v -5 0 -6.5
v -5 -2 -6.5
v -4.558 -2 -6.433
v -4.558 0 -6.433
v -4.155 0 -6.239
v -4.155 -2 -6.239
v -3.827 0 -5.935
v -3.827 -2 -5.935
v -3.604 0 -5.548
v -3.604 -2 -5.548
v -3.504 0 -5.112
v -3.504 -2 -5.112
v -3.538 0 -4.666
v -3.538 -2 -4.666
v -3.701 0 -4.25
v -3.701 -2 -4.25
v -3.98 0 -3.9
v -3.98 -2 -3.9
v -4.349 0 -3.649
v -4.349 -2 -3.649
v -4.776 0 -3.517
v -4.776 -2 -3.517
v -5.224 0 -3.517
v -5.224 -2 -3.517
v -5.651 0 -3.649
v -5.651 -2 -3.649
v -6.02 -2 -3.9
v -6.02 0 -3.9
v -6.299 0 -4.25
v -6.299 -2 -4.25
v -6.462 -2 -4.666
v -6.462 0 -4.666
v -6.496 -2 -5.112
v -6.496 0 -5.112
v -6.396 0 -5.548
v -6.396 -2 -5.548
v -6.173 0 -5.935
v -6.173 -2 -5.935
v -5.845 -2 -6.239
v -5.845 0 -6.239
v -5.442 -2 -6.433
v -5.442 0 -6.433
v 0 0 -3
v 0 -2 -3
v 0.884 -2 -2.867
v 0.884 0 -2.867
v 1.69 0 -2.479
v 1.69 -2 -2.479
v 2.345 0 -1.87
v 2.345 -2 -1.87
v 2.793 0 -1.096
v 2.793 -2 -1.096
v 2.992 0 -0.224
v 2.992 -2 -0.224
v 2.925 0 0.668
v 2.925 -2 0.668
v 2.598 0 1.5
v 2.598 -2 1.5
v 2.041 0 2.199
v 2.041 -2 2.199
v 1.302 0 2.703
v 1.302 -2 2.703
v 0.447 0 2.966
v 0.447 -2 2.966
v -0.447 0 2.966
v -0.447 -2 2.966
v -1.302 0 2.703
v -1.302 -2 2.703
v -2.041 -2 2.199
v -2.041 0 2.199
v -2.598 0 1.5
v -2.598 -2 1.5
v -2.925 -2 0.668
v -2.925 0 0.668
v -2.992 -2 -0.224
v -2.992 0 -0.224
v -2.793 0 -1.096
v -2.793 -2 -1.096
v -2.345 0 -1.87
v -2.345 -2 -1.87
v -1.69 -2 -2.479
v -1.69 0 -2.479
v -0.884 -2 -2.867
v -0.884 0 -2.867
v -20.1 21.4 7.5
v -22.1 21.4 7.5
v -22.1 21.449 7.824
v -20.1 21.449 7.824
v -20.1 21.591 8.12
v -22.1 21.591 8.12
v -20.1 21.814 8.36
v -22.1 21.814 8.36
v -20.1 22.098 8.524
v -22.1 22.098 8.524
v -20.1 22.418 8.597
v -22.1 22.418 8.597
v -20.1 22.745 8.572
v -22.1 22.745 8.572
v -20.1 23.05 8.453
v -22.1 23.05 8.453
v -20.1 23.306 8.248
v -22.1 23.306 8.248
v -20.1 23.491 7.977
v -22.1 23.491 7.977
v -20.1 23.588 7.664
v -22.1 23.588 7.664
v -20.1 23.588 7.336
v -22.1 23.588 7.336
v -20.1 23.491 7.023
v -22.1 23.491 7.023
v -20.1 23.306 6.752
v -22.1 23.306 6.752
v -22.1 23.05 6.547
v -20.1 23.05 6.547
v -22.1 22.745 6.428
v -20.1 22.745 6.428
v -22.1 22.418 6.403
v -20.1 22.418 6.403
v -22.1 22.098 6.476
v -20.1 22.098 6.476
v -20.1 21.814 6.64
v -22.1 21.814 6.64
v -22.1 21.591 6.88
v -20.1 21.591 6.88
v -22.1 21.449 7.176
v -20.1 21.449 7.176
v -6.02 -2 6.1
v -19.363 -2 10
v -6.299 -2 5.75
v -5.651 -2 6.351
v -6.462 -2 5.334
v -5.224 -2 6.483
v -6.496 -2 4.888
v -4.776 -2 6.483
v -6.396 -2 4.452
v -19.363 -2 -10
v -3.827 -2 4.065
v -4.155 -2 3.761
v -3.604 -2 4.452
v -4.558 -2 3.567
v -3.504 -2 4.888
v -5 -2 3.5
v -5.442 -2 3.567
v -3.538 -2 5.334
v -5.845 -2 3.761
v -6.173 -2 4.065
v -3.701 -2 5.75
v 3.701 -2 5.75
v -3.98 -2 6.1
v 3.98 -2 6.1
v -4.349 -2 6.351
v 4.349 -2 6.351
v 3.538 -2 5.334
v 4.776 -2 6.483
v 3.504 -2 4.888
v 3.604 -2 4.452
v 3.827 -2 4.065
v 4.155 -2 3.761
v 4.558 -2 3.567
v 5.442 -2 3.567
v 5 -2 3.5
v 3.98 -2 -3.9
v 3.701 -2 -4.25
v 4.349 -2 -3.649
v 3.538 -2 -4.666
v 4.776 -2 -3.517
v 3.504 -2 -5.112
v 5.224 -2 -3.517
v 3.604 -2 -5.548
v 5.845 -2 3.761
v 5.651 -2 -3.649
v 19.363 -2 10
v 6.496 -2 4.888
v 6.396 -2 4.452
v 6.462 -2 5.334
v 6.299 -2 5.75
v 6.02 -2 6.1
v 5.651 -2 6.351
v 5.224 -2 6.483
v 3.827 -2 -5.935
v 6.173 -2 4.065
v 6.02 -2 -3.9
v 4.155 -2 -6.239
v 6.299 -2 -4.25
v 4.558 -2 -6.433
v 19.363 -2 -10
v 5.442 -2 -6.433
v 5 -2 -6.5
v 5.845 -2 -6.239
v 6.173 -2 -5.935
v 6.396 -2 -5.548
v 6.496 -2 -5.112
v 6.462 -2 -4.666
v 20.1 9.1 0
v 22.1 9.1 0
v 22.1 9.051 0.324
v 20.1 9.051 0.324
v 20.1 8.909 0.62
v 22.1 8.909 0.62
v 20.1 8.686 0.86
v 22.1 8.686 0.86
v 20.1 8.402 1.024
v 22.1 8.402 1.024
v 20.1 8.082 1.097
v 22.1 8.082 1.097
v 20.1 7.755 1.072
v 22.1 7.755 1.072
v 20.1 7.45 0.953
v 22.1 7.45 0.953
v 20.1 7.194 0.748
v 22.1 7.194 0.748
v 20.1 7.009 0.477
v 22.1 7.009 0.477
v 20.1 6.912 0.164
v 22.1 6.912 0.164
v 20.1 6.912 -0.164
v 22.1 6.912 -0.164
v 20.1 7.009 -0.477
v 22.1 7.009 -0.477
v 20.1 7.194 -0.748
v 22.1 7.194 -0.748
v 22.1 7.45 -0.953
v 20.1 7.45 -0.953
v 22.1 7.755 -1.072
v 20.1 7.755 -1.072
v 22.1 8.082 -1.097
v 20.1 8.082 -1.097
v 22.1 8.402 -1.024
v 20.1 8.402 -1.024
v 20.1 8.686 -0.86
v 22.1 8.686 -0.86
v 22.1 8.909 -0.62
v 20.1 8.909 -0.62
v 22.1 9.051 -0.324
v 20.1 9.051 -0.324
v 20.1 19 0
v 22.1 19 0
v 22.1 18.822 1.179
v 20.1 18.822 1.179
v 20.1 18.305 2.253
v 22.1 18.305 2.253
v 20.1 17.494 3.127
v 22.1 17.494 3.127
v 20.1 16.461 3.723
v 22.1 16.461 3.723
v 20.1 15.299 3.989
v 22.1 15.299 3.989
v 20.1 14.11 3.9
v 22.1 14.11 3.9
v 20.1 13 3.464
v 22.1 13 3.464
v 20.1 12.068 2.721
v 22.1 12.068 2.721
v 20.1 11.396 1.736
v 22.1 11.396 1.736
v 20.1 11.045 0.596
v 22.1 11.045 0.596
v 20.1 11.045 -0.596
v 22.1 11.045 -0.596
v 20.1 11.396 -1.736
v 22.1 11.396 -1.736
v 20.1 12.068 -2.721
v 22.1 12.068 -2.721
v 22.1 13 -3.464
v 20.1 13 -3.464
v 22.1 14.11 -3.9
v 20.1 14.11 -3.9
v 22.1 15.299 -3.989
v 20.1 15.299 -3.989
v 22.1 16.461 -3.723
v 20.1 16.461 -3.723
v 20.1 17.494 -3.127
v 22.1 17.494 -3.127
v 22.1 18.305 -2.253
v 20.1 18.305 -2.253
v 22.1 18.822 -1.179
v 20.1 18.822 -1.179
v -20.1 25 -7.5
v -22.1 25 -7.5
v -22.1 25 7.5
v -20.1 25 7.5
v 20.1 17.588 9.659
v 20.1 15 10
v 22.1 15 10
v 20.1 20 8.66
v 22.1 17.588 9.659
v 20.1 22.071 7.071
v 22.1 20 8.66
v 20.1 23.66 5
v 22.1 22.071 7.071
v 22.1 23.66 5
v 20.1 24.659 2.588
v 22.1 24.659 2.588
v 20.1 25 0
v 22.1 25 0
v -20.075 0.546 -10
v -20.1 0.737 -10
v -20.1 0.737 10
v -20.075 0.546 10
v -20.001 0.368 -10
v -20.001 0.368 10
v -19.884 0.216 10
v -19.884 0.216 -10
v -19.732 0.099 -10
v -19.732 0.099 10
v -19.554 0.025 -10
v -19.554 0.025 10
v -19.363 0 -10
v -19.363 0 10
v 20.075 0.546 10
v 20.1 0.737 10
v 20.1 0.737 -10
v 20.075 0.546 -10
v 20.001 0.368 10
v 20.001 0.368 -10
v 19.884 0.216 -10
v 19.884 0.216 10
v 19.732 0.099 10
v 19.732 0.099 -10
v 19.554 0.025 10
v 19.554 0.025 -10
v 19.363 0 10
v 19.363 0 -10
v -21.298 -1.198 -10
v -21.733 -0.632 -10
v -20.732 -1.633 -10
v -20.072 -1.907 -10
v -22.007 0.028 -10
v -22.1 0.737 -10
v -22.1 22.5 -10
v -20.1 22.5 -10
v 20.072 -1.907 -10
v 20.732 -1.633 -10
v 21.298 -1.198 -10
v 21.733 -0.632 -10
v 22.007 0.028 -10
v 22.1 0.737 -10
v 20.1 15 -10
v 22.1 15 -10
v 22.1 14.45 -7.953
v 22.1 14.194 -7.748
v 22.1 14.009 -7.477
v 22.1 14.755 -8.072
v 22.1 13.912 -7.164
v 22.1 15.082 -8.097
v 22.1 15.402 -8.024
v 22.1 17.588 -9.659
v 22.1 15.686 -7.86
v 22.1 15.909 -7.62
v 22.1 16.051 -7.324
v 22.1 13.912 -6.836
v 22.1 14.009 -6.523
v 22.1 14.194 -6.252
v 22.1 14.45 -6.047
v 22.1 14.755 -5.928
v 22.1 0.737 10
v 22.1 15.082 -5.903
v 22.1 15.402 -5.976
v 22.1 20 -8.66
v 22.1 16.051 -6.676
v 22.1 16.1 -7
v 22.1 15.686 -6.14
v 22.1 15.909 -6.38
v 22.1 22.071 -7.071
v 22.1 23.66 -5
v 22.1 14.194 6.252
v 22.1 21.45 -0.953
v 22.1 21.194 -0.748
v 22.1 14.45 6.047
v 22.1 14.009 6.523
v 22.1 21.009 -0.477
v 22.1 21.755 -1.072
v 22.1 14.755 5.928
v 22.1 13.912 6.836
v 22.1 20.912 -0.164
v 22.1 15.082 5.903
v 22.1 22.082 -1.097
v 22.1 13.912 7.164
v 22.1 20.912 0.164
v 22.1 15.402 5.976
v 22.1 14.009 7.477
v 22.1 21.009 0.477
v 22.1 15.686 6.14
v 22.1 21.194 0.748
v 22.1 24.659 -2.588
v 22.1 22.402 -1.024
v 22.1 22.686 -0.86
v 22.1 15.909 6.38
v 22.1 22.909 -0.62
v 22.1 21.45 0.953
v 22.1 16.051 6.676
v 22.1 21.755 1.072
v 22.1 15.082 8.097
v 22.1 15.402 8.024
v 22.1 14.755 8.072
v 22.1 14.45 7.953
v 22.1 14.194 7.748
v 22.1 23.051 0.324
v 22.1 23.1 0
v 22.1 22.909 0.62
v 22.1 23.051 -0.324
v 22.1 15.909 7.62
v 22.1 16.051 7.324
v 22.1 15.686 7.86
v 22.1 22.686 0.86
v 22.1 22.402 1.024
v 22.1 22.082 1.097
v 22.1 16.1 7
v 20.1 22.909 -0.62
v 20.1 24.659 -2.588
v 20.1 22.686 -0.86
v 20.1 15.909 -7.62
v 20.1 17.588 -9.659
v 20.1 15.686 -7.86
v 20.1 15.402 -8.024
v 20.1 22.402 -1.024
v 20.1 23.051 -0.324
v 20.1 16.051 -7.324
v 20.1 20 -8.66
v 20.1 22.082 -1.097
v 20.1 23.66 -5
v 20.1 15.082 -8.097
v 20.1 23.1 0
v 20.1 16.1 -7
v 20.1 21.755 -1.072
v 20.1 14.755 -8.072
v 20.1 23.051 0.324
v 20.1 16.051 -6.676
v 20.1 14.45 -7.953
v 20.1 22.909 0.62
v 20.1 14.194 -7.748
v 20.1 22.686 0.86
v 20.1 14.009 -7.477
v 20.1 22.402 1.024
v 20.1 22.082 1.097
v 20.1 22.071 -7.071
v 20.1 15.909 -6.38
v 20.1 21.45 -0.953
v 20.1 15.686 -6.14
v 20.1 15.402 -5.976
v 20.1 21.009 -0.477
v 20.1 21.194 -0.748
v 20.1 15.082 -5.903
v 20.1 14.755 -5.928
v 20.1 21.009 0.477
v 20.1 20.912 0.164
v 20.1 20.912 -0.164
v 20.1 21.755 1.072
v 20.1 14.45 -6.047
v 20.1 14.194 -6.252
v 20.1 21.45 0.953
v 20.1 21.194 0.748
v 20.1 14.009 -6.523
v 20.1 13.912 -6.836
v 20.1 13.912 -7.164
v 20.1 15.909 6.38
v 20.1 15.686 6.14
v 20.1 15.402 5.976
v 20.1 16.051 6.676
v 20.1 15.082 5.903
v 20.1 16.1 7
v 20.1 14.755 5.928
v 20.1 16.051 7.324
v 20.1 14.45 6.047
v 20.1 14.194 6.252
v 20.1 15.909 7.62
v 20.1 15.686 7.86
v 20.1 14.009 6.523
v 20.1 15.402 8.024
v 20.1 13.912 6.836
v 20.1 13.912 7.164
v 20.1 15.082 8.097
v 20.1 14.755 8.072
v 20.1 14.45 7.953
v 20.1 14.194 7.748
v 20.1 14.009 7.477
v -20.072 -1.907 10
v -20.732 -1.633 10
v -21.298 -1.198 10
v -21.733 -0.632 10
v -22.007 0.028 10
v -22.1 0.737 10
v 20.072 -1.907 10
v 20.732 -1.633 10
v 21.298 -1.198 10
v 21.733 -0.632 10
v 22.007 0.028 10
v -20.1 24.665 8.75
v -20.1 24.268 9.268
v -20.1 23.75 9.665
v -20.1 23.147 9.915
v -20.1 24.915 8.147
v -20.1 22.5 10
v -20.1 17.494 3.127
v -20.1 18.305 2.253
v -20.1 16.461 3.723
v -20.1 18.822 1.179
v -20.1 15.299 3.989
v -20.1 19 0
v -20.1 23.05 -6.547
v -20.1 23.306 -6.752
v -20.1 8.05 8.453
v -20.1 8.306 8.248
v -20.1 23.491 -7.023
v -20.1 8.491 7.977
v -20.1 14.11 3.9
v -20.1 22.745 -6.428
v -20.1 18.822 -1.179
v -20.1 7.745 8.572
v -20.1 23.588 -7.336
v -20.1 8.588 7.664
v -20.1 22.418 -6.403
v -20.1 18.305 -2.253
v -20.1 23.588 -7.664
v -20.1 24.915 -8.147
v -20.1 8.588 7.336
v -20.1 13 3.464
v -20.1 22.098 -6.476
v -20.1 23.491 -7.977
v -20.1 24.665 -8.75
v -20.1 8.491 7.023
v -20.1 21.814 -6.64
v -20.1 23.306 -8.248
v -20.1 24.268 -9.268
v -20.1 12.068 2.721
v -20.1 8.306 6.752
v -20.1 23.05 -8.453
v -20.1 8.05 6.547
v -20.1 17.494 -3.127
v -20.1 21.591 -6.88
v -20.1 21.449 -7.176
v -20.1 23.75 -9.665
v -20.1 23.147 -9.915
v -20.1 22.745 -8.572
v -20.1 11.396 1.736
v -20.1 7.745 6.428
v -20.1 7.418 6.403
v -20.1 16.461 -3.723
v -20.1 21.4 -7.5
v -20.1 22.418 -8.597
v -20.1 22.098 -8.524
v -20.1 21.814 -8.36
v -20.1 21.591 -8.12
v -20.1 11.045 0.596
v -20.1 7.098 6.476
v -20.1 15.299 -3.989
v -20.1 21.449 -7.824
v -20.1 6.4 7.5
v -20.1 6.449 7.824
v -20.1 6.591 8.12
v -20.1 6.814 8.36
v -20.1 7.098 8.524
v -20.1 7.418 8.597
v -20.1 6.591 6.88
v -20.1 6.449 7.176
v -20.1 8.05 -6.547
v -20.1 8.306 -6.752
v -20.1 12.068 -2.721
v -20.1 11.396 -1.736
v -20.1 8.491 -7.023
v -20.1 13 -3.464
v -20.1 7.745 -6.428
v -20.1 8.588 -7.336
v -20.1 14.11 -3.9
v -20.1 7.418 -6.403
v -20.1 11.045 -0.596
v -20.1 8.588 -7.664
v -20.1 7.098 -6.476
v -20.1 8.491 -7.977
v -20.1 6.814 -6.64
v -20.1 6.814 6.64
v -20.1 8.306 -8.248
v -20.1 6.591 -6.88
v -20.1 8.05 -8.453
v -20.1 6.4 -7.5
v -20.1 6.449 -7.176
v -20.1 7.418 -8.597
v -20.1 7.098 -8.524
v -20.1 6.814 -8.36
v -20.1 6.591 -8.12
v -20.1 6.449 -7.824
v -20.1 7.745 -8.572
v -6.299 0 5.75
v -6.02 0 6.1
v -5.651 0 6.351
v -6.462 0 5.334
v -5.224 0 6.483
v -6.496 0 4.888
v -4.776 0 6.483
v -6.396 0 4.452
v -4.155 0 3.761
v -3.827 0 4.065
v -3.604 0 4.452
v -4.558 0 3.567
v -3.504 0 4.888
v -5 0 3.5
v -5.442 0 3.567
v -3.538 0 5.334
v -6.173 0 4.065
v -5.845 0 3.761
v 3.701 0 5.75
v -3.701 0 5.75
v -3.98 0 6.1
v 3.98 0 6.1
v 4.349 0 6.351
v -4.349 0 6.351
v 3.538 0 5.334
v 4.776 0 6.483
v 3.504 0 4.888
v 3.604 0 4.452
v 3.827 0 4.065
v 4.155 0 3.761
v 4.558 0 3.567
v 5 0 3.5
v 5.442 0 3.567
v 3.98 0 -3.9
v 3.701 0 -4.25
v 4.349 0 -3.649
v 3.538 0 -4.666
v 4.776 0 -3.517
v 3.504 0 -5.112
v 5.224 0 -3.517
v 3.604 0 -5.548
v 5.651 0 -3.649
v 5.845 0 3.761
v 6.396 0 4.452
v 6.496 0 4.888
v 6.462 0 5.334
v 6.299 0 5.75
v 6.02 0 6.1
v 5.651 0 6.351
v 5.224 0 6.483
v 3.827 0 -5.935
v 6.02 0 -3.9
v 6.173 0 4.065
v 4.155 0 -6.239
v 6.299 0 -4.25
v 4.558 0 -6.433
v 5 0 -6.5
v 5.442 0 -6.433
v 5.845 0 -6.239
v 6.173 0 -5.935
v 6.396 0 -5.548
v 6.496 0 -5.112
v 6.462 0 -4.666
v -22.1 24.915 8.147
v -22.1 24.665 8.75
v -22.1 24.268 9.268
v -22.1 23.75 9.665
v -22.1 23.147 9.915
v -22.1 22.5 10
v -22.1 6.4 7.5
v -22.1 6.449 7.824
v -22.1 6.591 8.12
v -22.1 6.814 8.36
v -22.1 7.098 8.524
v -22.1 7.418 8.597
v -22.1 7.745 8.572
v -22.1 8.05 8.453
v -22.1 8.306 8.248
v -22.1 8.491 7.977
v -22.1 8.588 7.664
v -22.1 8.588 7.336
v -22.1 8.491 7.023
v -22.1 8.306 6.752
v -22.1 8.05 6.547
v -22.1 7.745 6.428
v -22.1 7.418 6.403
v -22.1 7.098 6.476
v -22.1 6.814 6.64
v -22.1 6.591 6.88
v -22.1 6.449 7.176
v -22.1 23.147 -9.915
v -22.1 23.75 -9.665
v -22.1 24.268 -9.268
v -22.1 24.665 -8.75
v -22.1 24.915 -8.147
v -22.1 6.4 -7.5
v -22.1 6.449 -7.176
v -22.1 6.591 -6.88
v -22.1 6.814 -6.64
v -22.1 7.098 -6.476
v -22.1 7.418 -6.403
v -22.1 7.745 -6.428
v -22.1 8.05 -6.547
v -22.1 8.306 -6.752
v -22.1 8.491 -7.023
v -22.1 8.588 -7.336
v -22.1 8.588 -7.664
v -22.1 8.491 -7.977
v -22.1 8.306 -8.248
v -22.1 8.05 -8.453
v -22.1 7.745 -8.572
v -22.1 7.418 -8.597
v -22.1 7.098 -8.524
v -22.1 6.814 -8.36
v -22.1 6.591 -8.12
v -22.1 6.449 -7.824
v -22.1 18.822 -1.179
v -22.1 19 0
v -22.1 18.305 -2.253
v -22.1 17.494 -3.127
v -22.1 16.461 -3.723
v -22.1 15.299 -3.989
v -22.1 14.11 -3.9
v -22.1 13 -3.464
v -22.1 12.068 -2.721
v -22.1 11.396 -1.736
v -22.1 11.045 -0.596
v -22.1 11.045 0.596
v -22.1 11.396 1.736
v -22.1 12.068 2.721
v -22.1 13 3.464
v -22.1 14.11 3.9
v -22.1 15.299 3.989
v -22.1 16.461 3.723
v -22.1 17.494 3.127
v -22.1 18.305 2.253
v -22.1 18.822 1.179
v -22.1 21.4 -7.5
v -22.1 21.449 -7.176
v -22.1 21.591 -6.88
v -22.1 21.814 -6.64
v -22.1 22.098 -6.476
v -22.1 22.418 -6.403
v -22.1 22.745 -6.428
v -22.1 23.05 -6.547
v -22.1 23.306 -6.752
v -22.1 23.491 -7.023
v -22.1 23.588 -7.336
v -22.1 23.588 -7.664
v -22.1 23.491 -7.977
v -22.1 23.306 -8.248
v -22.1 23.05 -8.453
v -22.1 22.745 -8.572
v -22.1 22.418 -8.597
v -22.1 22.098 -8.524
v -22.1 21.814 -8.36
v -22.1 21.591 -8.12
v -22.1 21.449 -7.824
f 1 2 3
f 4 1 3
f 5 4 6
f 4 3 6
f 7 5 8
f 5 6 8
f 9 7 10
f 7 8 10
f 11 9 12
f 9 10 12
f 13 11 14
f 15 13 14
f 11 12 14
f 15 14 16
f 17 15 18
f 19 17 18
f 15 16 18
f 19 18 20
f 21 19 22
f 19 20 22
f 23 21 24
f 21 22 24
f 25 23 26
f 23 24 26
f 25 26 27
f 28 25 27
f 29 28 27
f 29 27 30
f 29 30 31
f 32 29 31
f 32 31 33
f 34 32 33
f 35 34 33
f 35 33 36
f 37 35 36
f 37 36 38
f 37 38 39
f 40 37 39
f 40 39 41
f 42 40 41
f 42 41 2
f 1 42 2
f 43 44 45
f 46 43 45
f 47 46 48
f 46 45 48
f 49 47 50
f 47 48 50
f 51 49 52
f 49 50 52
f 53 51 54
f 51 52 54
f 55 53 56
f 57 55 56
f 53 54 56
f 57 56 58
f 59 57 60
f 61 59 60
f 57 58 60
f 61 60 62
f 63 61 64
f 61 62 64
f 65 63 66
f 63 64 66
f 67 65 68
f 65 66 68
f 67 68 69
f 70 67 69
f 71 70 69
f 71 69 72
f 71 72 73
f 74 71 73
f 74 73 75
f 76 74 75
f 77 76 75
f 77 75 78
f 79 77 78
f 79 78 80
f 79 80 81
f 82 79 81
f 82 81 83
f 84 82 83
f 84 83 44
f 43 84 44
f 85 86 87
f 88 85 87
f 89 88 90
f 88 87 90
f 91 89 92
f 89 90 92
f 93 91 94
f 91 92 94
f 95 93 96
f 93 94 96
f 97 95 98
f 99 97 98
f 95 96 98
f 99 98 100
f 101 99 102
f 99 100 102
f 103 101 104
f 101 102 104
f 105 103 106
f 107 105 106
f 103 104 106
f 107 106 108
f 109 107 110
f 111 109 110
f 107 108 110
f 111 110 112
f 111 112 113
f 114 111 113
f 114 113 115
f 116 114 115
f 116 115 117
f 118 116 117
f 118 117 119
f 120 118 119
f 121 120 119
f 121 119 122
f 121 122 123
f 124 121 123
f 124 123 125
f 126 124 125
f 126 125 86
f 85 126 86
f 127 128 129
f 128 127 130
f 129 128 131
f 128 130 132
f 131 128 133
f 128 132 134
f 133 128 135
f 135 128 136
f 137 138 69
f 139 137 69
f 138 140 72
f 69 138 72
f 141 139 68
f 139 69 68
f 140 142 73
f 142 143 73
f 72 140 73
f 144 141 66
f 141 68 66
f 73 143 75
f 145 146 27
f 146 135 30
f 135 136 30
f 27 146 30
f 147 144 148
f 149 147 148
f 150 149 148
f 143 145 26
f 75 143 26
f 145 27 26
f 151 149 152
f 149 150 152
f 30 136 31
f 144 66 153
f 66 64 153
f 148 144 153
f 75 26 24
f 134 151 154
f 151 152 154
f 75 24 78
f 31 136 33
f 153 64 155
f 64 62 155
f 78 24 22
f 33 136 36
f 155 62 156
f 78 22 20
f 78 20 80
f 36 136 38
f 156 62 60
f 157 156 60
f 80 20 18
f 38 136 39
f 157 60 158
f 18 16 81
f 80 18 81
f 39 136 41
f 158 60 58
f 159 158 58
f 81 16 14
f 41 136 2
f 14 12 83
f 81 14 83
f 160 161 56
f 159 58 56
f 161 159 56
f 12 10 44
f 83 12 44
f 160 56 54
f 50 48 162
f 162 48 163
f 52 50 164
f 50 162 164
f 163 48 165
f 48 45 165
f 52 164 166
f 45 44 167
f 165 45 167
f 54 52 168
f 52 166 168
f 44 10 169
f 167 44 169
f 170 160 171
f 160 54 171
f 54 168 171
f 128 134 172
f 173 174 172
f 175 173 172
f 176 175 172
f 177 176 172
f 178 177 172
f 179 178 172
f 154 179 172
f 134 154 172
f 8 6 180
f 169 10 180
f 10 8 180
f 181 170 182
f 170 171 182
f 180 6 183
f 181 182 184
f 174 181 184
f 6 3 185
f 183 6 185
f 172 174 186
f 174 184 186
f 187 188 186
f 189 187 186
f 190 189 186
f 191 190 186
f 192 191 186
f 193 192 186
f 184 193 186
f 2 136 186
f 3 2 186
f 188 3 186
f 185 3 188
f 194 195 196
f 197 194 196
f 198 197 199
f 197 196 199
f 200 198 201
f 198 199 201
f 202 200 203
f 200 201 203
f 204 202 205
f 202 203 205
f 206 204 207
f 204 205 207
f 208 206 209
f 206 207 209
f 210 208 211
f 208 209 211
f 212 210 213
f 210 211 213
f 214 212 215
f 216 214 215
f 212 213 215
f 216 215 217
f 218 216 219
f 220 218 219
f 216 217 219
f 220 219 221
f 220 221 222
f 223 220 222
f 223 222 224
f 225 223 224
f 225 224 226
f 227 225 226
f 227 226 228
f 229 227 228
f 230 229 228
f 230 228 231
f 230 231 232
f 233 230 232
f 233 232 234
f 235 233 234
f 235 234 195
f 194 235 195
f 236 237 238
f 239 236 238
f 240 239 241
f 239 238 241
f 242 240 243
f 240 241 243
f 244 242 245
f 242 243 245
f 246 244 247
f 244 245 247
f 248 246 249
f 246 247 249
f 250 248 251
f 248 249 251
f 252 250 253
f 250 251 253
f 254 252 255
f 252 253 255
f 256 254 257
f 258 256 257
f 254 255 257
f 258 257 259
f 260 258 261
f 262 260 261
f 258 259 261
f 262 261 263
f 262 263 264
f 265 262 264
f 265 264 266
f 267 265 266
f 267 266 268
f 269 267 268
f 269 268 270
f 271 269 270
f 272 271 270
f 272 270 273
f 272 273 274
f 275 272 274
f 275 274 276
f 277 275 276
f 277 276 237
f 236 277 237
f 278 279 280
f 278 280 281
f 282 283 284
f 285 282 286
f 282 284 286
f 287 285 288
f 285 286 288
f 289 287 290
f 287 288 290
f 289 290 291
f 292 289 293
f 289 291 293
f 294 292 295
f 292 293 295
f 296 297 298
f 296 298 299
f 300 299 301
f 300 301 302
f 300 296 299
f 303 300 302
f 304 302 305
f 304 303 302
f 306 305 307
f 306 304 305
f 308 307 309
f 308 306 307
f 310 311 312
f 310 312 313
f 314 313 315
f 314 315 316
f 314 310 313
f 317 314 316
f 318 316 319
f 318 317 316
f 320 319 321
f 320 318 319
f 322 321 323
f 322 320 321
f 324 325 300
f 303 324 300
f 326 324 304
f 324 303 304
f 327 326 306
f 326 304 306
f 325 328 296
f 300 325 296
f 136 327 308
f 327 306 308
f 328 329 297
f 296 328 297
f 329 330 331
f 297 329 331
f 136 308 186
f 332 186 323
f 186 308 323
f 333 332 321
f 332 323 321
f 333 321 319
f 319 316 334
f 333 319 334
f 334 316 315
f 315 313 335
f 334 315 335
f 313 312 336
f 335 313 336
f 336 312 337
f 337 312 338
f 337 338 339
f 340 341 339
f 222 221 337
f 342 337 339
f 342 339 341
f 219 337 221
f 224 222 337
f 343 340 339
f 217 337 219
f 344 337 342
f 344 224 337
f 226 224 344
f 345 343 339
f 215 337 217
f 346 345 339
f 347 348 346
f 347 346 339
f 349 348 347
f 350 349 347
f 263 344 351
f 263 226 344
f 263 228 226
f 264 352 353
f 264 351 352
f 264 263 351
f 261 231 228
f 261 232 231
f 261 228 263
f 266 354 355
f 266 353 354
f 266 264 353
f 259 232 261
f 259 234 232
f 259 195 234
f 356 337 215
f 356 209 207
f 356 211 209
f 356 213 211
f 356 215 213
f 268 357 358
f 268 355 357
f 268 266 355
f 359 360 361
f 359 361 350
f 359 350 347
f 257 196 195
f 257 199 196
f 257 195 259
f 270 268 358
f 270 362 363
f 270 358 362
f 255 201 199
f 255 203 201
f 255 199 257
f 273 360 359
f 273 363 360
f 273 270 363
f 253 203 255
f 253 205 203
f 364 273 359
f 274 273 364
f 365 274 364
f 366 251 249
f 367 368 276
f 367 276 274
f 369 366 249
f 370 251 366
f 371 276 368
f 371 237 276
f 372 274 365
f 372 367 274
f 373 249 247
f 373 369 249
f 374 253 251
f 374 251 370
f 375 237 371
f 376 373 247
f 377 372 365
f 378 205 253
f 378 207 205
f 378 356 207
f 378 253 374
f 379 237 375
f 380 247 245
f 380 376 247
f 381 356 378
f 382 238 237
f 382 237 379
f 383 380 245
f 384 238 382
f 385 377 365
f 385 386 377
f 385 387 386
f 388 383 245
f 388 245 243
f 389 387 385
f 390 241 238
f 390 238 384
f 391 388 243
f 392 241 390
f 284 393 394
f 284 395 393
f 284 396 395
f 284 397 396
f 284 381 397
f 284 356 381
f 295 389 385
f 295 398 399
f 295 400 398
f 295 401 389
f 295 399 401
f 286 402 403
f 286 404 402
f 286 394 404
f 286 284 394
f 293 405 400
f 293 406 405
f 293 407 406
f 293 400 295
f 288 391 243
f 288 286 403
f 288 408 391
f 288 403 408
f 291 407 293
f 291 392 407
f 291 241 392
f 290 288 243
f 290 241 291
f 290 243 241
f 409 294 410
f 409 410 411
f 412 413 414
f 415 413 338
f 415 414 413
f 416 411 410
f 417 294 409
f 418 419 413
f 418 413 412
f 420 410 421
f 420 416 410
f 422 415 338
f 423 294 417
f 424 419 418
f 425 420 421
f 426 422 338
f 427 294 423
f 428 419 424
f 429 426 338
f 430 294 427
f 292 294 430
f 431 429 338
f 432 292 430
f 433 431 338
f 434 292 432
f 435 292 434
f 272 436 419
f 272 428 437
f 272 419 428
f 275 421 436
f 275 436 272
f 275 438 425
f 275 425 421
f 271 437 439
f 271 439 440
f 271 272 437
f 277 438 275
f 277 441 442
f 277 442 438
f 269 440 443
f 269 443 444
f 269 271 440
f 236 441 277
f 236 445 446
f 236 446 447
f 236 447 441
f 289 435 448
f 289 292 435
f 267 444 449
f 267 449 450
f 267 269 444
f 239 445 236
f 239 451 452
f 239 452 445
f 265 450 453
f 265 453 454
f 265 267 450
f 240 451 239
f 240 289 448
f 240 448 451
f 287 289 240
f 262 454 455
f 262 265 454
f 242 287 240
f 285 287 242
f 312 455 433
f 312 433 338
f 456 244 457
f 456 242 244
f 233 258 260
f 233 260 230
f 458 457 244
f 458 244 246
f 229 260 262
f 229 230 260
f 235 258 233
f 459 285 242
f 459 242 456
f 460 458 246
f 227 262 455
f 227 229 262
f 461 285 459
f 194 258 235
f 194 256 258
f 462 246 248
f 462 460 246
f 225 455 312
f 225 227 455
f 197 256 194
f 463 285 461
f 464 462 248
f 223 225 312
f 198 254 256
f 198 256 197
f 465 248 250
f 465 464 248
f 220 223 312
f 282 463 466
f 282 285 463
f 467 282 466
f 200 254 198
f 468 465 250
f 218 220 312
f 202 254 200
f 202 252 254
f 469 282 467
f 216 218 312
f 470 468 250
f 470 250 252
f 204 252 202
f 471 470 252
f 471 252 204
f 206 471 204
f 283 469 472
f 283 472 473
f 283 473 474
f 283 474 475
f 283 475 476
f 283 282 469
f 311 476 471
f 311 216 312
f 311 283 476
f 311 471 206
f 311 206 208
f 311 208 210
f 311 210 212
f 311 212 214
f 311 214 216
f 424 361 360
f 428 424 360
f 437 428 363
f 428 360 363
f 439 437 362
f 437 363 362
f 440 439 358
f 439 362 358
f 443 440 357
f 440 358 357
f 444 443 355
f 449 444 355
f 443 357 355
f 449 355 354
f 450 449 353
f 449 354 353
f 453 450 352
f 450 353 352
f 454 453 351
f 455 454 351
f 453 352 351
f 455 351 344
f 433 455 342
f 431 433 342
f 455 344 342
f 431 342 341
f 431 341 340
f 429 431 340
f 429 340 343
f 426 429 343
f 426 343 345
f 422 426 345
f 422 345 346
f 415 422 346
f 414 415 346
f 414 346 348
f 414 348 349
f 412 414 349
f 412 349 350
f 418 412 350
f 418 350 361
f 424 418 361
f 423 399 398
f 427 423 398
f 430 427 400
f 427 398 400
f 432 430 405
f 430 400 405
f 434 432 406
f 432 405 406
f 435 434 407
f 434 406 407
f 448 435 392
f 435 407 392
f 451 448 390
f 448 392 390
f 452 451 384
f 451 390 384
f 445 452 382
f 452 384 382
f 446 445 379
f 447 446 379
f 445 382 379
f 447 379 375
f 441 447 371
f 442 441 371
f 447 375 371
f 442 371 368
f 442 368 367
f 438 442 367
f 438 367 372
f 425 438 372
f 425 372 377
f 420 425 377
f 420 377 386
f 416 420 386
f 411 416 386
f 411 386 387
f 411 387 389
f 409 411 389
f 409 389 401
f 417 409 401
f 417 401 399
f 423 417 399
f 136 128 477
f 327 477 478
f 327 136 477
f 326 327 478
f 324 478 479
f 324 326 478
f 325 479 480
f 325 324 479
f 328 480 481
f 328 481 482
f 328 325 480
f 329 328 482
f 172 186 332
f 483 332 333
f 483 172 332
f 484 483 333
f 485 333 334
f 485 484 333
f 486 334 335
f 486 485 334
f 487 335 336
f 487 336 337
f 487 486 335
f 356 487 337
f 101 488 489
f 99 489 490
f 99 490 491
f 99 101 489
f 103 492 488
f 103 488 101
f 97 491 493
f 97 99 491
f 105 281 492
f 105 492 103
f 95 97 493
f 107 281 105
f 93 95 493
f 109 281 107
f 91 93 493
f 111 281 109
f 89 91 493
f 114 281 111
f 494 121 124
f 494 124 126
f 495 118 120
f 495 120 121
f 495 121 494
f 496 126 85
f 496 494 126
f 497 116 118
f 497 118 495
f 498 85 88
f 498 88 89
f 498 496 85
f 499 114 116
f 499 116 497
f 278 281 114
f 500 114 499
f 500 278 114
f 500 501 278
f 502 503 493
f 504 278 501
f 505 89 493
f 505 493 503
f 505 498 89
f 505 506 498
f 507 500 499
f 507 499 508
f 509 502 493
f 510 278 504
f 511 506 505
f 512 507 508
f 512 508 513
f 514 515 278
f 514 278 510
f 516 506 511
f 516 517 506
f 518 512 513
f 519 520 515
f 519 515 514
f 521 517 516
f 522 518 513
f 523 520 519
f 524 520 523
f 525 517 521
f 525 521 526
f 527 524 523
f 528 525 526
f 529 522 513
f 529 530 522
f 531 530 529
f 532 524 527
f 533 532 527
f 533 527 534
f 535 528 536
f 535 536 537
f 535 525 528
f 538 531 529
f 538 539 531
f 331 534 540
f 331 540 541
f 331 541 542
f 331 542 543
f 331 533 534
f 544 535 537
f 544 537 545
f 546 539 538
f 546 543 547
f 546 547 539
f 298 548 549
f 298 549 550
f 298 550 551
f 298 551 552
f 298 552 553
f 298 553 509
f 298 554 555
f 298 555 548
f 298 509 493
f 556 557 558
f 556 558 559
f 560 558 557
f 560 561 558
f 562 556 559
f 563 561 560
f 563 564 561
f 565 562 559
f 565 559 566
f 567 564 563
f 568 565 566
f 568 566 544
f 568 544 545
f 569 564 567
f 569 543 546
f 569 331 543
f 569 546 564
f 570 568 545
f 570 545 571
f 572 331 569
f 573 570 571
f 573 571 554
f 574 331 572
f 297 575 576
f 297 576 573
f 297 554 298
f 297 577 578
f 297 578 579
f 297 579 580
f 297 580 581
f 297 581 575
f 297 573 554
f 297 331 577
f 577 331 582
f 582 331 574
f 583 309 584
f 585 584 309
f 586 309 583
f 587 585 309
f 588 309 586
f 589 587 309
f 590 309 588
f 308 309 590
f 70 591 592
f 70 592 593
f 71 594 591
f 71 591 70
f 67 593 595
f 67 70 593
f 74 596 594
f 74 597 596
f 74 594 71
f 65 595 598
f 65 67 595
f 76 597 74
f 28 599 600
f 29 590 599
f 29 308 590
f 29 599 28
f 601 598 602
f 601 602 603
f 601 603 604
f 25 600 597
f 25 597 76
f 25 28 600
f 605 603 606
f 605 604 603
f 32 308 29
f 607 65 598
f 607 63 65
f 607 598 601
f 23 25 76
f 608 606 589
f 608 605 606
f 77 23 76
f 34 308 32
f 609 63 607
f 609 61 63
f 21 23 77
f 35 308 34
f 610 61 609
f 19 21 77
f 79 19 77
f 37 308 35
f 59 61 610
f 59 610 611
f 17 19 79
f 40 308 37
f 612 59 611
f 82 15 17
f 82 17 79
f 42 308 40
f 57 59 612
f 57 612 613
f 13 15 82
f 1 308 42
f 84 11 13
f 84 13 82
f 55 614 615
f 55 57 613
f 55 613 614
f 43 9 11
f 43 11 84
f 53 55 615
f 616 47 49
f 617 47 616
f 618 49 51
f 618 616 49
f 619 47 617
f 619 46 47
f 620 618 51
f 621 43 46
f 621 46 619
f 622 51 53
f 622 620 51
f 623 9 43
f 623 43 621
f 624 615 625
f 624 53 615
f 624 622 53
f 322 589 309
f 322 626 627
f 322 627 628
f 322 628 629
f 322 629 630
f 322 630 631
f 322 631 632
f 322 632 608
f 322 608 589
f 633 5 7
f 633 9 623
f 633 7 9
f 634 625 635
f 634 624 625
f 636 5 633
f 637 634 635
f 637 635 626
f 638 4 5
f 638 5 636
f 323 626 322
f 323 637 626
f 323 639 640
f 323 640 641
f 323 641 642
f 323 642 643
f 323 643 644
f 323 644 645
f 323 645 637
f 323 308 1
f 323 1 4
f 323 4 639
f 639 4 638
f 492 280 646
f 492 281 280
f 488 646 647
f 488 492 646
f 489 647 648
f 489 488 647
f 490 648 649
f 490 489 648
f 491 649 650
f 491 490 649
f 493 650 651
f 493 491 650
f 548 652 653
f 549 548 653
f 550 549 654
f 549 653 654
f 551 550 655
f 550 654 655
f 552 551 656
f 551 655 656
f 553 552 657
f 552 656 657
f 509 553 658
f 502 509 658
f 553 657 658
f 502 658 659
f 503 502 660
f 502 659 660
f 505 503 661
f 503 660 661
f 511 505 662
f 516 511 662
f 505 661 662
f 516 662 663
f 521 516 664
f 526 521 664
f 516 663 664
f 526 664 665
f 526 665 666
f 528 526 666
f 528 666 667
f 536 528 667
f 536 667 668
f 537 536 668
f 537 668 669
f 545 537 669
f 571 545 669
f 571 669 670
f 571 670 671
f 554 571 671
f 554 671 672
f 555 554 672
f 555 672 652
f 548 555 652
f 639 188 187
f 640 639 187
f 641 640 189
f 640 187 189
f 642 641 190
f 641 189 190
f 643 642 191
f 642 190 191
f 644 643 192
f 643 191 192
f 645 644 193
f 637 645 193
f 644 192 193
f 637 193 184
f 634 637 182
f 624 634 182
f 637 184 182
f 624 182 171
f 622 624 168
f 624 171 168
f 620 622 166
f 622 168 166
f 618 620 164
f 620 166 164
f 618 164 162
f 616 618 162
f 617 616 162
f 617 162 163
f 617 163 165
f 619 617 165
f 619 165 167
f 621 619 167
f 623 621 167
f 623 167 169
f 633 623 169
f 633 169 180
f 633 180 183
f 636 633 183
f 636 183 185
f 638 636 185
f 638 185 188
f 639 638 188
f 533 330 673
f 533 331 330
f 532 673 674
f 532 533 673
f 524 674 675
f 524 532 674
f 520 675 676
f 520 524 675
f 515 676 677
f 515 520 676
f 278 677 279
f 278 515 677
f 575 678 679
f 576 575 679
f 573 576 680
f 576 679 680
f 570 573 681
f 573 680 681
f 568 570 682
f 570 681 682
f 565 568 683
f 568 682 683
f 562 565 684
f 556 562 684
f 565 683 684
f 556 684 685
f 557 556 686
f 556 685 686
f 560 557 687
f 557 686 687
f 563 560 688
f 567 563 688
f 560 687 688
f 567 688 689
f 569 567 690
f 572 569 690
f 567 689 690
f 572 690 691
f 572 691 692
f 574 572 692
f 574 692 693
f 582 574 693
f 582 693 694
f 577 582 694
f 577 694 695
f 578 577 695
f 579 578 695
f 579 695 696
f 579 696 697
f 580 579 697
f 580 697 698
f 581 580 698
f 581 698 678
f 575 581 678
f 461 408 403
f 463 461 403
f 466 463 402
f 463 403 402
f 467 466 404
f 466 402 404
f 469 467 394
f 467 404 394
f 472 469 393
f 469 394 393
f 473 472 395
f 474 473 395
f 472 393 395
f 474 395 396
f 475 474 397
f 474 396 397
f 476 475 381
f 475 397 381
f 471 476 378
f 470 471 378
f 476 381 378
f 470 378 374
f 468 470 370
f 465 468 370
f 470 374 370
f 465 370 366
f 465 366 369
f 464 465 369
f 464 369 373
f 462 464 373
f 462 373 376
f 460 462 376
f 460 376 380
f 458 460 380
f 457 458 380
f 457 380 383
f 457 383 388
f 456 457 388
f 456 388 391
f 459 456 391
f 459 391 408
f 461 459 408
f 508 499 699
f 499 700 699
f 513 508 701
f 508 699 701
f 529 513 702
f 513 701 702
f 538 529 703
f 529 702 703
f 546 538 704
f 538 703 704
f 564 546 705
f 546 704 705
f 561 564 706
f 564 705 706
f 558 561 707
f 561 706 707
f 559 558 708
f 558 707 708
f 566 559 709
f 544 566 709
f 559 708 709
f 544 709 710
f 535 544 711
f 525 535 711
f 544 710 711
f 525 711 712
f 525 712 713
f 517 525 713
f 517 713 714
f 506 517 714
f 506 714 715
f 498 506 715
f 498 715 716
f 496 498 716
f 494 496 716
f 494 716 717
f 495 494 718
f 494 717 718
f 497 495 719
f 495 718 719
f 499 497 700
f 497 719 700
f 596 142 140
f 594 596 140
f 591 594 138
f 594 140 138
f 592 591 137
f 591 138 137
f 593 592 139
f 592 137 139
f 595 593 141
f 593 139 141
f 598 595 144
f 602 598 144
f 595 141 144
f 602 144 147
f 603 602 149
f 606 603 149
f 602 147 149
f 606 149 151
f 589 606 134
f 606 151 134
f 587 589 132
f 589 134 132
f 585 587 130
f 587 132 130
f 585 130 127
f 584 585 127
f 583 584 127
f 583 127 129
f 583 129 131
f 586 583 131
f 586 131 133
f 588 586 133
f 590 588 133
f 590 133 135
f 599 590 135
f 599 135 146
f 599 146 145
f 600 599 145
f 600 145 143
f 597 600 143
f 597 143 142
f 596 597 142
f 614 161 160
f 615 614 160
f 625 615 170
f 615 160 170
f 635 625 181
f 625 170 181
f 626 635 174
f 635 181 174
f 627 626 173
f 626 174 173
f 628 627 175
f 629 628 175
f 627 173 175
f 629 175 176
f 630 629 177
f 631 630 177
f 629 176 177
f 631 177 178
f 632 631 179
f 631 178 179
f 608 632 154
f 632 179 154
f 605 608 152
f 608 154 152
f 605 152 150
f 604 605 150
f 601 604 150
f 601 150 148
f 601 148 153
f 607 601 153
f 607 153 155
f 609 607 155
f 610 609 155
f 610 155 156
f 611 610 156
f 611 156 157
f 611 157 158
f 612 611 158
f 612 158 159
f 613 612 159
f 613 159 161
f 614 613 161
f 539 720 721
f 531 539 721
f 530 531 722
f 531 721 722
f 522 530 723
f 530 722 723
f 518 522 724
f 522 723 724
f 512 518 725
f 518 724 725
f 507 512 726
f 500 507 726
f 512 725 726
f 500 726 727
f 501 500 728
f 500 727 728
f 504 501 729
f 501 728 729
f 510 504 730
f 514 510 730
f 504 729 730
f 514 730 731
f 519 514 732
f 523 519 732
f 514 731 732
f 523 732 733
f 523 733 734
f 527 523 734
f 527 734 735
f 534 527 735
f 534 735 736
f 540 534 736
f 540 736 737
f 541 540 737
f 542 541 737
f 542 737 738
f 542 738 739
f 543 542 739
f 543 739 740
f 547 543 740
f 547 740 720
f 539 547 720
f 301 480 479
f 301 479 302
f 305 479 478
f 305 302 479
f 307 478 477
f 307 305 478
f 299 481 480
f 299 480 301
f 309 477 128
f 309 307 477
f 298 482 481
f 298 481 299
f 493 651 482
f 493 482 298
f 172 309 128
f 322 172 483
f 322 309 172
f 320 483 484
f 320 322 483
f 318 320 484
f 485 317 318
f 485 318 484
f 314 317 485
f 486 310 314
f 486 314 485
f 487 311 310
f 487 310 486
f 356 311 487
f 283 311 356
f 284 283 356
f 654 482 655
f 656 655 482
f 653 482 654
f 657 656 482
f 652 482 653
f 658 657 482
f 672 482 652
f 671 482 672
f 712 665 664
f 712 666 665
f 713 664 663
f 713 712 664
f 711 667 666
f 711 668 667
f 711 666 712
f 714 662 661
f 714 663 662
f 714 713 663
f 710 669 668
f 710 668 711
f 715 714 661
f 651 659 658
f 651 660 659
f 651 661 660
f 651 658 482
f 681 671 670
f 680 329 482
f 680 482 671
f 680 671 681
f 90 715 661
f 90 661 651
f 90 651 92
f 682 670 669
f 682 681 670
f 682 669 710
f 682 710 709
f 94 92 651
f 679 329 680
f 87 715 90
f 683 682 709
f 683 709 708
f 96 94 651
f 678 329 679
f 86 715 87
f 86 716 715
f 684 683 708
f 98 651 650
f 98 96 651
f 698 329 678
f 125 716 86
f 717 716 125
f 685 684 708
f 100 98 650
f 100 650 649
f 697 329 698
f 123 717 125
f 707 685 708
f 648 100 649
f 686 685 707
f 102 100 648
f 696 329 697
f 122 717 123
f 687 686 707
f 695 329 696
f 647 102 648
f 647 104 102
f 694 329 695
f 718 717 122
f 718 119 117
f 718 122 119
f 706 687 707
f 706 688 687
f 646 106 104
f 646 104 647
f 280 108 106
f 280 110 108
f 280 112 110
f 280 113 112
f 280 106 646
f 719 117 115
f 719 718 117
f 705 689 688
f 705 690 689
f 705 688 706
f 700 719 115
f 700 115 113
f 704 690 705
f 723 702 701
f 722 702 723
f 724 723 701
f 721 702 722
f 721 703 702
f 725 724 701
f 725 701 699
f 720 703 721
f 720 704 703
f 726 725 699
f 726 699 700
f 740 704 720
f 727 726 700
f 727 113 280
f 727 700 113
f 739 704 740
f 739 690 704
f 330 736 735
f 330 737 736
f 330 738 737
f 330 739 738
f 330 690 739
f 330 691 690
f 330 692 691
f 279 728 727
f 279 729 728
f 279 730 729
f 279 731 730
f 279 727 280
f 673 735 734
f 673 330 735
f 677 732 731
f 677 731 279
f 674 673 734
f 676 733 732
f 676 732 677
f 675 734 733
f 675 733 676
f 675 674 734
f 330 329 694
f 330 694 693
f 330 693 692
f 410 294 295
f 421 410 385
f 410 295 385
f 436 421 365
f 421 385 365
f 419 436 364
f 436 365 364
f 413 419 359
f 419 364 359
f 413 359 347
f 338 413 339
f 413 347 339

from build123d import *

# Parameters (mm, degrees)
SKETCH_1_W                         = 44.2
SKETCH_1_H                         = 20
SM_BASE_FLANGE_1_DEPTH             = 2
SM_EDGE_FLANGE_1_STRIP_W           = 9.4732
SM_EDGE_FLANGE_1_STRIP_H           = 2
SM_EDGE_FLANGE_1_STRIP_CUT_DEPTH   = 20
SM_EDGE_FLANGE_1_STRIP_2_W         = 9.4732
SM_EDGE_FLANGE_1_STRIP_2_H         = 2
SM_EDGE_FLANGE_1_STRIP_CUT_2_DEPTH = 20
SM_EDGE_FLANGE_1_DEPTH             = 20
SM_EDGE_FLANGE_1_BEND_DEPTH        = 20
CUT_EXTRUDE_1_REACH                = 53.756
SKETCH_14_R                        = 4
SKETCH_14_R_2                      = 1.1
CUT_EXTRUDE_2_REACH                = 53.756
SKETCH_15_R                        = 4
SKETCH_15_R_2                      = 1.1
FILLET_4_R                         = 2.5
FILLET_5_R                         = 2.5
CUT_EXTRUDE_3_REACH                = 38.296
SKETCH_16_R                        = 3
SKETCH_16_R_2                      = 1.5


# Sheet-metal steps are written as plain solids
with BuildPart() as part:
    # Sketch 1 → 基体-法兰1 (new body)
    with BuildSketch(Plane(origin=(0, 0, 0), x_dir=(1, 0, 0), z_dir=(0, 1, 0))):
        Rectangle(SKETCH_1_W, SKETCH_1_H)
    extrude(amount=-SM_BASE_FLANGE_1_DEPTH)

    # 边线-法兰1 strip (across the edge) → 边线-法兰1 strip cut (cut)
    with BuildSketch(Plane(origin=(-22.1, 0, -10), x_dir=(1, 0, 0), z_dir=(0, 0, 1))):
        with Locations((-2, -1)):
            Rectangle(SM_EDGE_FLANGE_1_STRIP_W, SM_EDGE_FLANGE_1_STRIP_H)
    extrude(amount=SM_EDGE_FLANGE_1_STRIP_CUT_DEPTH, mode=Mode.SUBTRACT)

    # 边线-法兰1 strip 2 (across the edge) → 边线-法兰1 strip cut 2 (cut)
    with BuildSketch(Plane(origin=(22.1, 0, 10), x_dir=(-1, 0, 0), z_dir=(0, 0, -1))):
        with Locations((-2, -1)):
            Rectangle(SM_EDGE_FLANGE_1_STRIP_2_W, SM_EDGE_FLANGE_1_STRIP_2_H)
    extrude(amount=SM_EDGE_FLANGE_1_STRIP_CUT_2_DEPTH, mode=Mode.SUBTRACT)

    # 边线-法兰1 section (across the edge) → 边线-法兰1 (add)
    with BuildSketch(Plane(origin=(-22.1, 0, -10), x_dir=(1, 0, 0), z_dir=(0, 0, 1))):
        with BuildLine():
            Line((0, 0.7366), (0, 25))
            Line((0, 25), (2, 25))
            Line((2, 25), (2, 0.7366))
            ThreePointArc((2, 0.7366), (2.215745145, 0.215745145), (2.7366, 0))
            Line((2.7366, 0), (2.7366, -2))
            ThreePointArc((2.7366, -2), (0.801531583, -1.198468417), (0, 0.7366))
        make_face()
    extrude(amount=SM_EDGE_FLANGE_1_DEPTH)

    # 边线-法兰1 section 2 (across the edge) → 边线-法兰1 bend (add)
    with BuildSketch(Plane(origin=(22.1, 0, 10), x_dir=(-1, 0, 0), z_dir=(0, 0, -1))):
        with BuildLine():
            Line((0, 0.7366), (0, 25))
            Line((0, 25), (2, 25))
            Line((2, 25), (2, 0.7366))
            ThreePointArc((2, 0.7366), (2.215745145, 0.215745145), (2.7366, 0))
            Line((2.7366, 0), (2.7366, -2))
            ThreePointArc((2.7366, -2), (0.801531583, -1.198468417), (0, 0.7366))
        make_face()
    extrude(amount=SM_EDGE_FLANGE_1_BEND_DEPTH)

    # 草图14 → 切除-拉伸1 (cut, up to next)
    with BuildSketch(Plane(origin=(22.1, 0, 0), x_dir=(0, 0, -1), z_dir=(1, 0, 0)), mode=Mode.PRIVATE) as cut_extrude_1_sk1:
        with BuildLine():
            ThreePointArc((-10, 15), (-7.071067812, 22.071067812), (0, 25))
            Line((0, 25), (-10, 25))
            Line((-10, 25), (-10, 15))
        make_face()
    cut_extrude_1_tool1 = extrude(cut_extrude_1_sk1.sketch, amount=-CUT_EXTRUDE_1_REACH, mode=Mode.PRIVATE) & part.part
    # 草图14 → 切除-拉伸1 (cut, up to next)
    with BuildSketch(Plane(origin=(22.1, 0, 0), x_dir=(0, 0, -1), z_dir=(1, 0, 0)), mode=Mode.PRIVATE) as cut_extrude_1_sk2:
        with BuildLine():
            ThreePointArc((0, 25), (7.071067812, 22.071067812), (10, 15))
            Line((10, 15), (10, 25))
            Line((10, 25), (0, 25))
        make_face()
    cut_extrude_1_tool2 = extrude(cut_extrude_1_sk2.sketch, amount=-CUT_EXTRUDE_1_REACH, mode=Mode.PRIVATE) & part.part
    # 草图14 → 切除-拉伸1 (cut, up to next)
    with BuildSketch(Plane(origin=(22.1, 0, 0), x_dir=(0, 0, -1), z_dir=(1, 0, 0)), mode=Mode.PRIVATE) as cut_extrude_1_sk3:
        with Locations(Location((0, 15, 0), (0, 0, 90))):
            Circle(SKETCH_14_R)
    cut_extrude_1_tool3 = extrude(cut_extrude_1_sk3.sketch, amount=-CUT_EXTRUDE_1_REACH, mode=Mode.PRIVATE) & part.part
    # 草图14 → 切除-拉伸1 (cut, up to next)
    with BuildSketch(Plane(origin=(22.1, 0, 0), x_dir=(0, 0, -1), z_dir=(1, 0, 0)), mode=Mode.PRIVATE) as cut_extrude_1_sk4:
        with Locations(Location((-7, 15, 0), (0, 0, 90))):
            Circle(SKETCH_14_R_2)
    cut_extrude_1_tool4 = extrude(cut_extrude_1_sk4.sketch, amount=-CUT_EXTRUDE_1_REACH, mode=Mode.PRIVATE) & part.part
    # 草图14 → 切除-拉伸1 (cut, up to next)
    with BuildSketch(Plane(origin=(22.1, 0, 0), x_dir=(0, 0, -1), z_dir=(1, 0, 0)), mode=Mode.PRIVATE) as cut_extrude_1_sk5:
        with Locations(Location((0, 22, 0), (0, 0, 90))):
            Circle(SKETCH_14_R_2)
    cut_extrude_1_tool5 = extrude(cut_extrude_1_sk5.sketch, amount=-CUT_EXTRUDE_1_REACH, mode=Mode.PRIVATE) & part.part
    # 草图14 → 切除-拉伸1 (cut, up to next)
    with BuildSketch(Plane(origin=(22.1, 0, 0), x_dir=(0, 0, -1), z_dir=(1, 0, 0)), mode=Mode.PRIVATE) as cut_extrude_1_sk6:
        with Locations(Location((7, 15, 0), (0, 0, 90))):
            Circle(SKETCH_14_R_2)
    cut_extrude_1_tool6 = extrude(cut_extrude_1_sk6.sketch, amount=-CUT_EXTRUDE_1_REACH, mode=Mode.PRIVATE) & part.part
    # 草图14 → 切除-拉伸1 (cut, up to next)
    with BuildSketch(Plane(origin=(22.1, 0, 0), x_dir=(0, 0, -1), z_dir=(1, 0, 0)), mode=Mode.PRIVATE) as cut_extrude_1_sk7:
        with Locations(Location((0, 8, 0), (0, 0, 90))):
            Circle(SKETCH_14_R_2)
    cut_extrude_1_tool7 = extrude(cut_extrude_1_sk7.sketch, amount=-CUT_EXTRUDE_1_REACH, mode=Mode.PRIVATE) & part.part
    add(cut_extrude_1_tool1.solids().sort_by_distance((22.1, 22.766321, 7.766321))[0], mode=Mode.SUBTRACT)
    add(cut_extrude_1_tool2.solids().sort_by_distance((22.1, 22.766321, -7.766321))[0], mode=Mode.SUBTRACT)
    add(cut_extrude_1_tool3.solids().sort_by_distance((22.1, 15, 0))[0], mode=Mode.SUBTRACT)
    add(cut_extrude_1_tool4.solids().sort_by_distance((22.1, 15, 7))[0], mode=Mode.SUBTRACT)
    add(cut_extrude_1_tool5.solids().sort_by_distance((22.1, 22, 0))[0], mode=Mode.SUBTRACT)
    add(cut_extrude_1_tool6.solids().sort_by_distance((22.1, 15, -7))[0], mode=Mode.SUBTRACT)
    add(cut_extrude_1_tool7.solids().sort_by_distance((22.1, 8, 0))[0], mode=Mode.SUBTRACT)

    # 草图15 → 切除-拉伸2 (cut, up to next)
    with BuildSketch(Plane.ZY.offset(22.1), mode=Mode.PRIVATE) as cut_extrude_2_sk1:
        with Locations(Location((0, 15, 0), (0, 0, 90))):
            Circle(SKETCH_15_R)
    cut_extrude_2_tool1 = extrude(cut_extrude_2_sk1.sketch, amount=-CUT_EXTRUDE_2_REACH, mode=Mode.PRIVATE) & part.part
    # 草图15 → 切除-拉伸2 (cut, up to next)
    with BuildSketch(Plane.ZY.offset(22.1), mode=Mode.PRIVATE) as cut_extrude_2_sk2:
        with Locations(Location((-7.5, 22.5, 0), (0, 0, 270))):
            Circle(SKETCH_15_R_2)
    cut_extrude_2_tool2 = extrude(cut_extrude_2_sk2.sketch, amount=-CUT_EXTRUDE_2_REACH, mode=Mode.PRIVATE) & part.part
    # 草图15 → 切除-拉伸2 (cut, up to next)
    with BuildSketch(Plane.ZY.offset(22.1), mode=Mode.PRIVATE) as cut_extrude_2_sk3:
        with Locations(Location((-7.5, 7.5, 0), (0, 0, 270))):
            Circle(SKETCH_15_R_2)
    cut_extrude_2_tool3 = extrude(cut_extrude_2_sk3.sketch, amount=-CUT_EXTRUDE_2_REACH, mode=Mode.PRIVATE) & part.part
    # 草图15 → 切除-拉伸2 (cut, up to next)
    with BuildSketch(Plane.ZY.offset(22.1), mode=Mode.PRIVATE) as cut_extrude_2_sk4:
        with Locations(Location((7.5, 7.5, 0), (0, 0, 270))):
            Circle(SKETCH_15_R_2)
    cut_extrude_2_tool4 = extrude(cut_extrude_2_sk4.sketch, amount=-CUT_EXTRUDE_2_REACH, mode=Mode.PRIVATE) & part.part
    # 草图15 → 切除-拉伸2 (cut, up to next)
    with BuildSketch(Plane.ZY.offset(22.1), mode=Mode.PRIVATE) as cut_extrude_2_sk5:
        with Locations(Location((7.5, 22.5, 0), (0, 0, 270))):
            Circle(SKETCH_15_R_2)
    cut_extrude_2_tool5 = extrude(cut_extrude_2_sk5.sketch, amount=-CUT_EXTRUDE_2_REACH, mode=Mode.PRIVATE) & part.part
    add(cut_extrude_2_tool1.solids().sort_by_distance((-22.1, 15, 0))[0], mode=Mode.SUBTRACT)
    add(cut_extrude_2_tool2.solids().sort_by_distance((-22.1, 22.5, -7.5))[0], mode=Mode.SUBTRACT)
    add(cut_extrude_2_tool3.solids().sort_by_distance((-22.1, 7.5, -7.5))[0], mode=Mode.SUBTRACT)
    add(cut_extrude_2_tool4.solids().sort_by_distance((-22.1, 7.5, 7.5))[0], mode=Mode.SUBTRACT)
    add(cut_extrude_2_tool5.solids().sort_by_distance((-22.1, 22.5, 7.5))[0], mode=Mode.SUBTRACT)

    # 圆角4
    fillet_4_edges = [part.edges().sort_by_distance(p)[0] for p in [
        (-21.1, 25, -10),
    ]]
    fillet(fillet_4_edges, radius=FILLET_4_R)

    # 圆角5
    fillet_5_edges = [part.edges().sort_by_distance(p)[0] for p in [
        (-21.1, 25, 10),
    ]]
    fillet(fillet_5_edges, radius=FILLET_5_R)

    # 草图16 → 切除-拉伸3 (cut, up to next)
    with BuildSketch(Plane.XZ.offset(2), mode=Mode.PRIVATE) as cut_extrude_3_sk1:
        with Locations(Location((0, 0, 0), (0, 0, 270))):
            Circle(SKETCH_16_R)
    cut_extrude_3_tool1 = extrude(cut_extrude_3_sk1.sketch, amount=-CUT_EXTRUDE_3_REACH, mode=Mode.PRIVATE) & part.part
    # 草图16 → 切除-拉伸3 (cut, up to next)
    with BuildSketch(Plane.XZ.offset(2), mode=Mode.PRIVATE) as cut_extrude_3_sk2:
        with Locations(Location((-5, 5, 0), (0, 0, 270))):
            Circle(SKETCH_16_R_2)
    cut_extrude_3_tool2 = extrude(cut_extrude_3_sk2.sketch, amount=-CUT_EXTRUDE_3_REACH, mode=Mode.PRIVATE) & part.part
    # 草图16 → 切除-拉伸3 (cut, up to next)
    with BuildSketch(Plane.XZ.offset(2), mode=Mode.PRIVATE) as cut_extrude_3_sk3:
        with Locations(Location((5, 5, 0), (0, 0, 270))):
            Circle(SKETCH_16_R_2)
    cut_extrude_3_tool3 = extrude(cut_extrude_3_sk3.sketch, amount=-CUT_EXTRUDE_3_REACH, mode=Mode.PRIVATE) & part.part
    # 草图16 → 切除-拉伸3 (cut, up to next)
    with BuildSketch(Plane.XZ.offset(2), mode=Mode.PRIVATE) as cut_extrude_3_sk4:
        with Locations(Location((5, -5, 0), (0, 0, 270))):
            Circle(SKETCH_16_R_2)
    cut_extrude_3_tool4 = extrude(cut_extrude_3_sk4.sketch, amount=-CUT_EXTRUDE_3_REACH, mode=Mode.PRIVATE) & part.part
    # 草图16 → 切除-拉伸3 (cut, up to next)
    with BuildSketch(Plane.XZ.offset(2), mode=Mode.PRIVATE) as cut_extrude_3_sk5:
        with Locations(Location((-5, -5, 0), (0, 0, 270))):
            Circle(SKETCH_16_R_2)
    cut_extrude_3_tool5 = extrude(cut_extrude_3_sk5.sketch, amount=-CUT_EXTRUDE_3_REACH, mode=Mode.PRIVATE) & part.part
    add(cut_extrude_3_tool1.solids().sort_by_distance((0, -2, 0))[0], mode=Mode.SUBTRACT)
    add(cut_extrude_3_tool2.solids().sort_by_distance((-5, -2, 5))[0], mode=Mode.SUBTRACT)
    add(cut_extrude_3_tool3.solids().sort_by_distance((5, -2, 5))[0], mode=Mode.SUBTRACT)
    add(cut_extrude_3_tool4.solids().sort_by_distance((5, -2, -5))[0], mode=Mode.SUBTRACT)
    add(cut_extrude_3_tool5.solids().sort_by_distance((-5, -2, -5))[0], mode=Mode.SUBTRACT)


solid = part.part
